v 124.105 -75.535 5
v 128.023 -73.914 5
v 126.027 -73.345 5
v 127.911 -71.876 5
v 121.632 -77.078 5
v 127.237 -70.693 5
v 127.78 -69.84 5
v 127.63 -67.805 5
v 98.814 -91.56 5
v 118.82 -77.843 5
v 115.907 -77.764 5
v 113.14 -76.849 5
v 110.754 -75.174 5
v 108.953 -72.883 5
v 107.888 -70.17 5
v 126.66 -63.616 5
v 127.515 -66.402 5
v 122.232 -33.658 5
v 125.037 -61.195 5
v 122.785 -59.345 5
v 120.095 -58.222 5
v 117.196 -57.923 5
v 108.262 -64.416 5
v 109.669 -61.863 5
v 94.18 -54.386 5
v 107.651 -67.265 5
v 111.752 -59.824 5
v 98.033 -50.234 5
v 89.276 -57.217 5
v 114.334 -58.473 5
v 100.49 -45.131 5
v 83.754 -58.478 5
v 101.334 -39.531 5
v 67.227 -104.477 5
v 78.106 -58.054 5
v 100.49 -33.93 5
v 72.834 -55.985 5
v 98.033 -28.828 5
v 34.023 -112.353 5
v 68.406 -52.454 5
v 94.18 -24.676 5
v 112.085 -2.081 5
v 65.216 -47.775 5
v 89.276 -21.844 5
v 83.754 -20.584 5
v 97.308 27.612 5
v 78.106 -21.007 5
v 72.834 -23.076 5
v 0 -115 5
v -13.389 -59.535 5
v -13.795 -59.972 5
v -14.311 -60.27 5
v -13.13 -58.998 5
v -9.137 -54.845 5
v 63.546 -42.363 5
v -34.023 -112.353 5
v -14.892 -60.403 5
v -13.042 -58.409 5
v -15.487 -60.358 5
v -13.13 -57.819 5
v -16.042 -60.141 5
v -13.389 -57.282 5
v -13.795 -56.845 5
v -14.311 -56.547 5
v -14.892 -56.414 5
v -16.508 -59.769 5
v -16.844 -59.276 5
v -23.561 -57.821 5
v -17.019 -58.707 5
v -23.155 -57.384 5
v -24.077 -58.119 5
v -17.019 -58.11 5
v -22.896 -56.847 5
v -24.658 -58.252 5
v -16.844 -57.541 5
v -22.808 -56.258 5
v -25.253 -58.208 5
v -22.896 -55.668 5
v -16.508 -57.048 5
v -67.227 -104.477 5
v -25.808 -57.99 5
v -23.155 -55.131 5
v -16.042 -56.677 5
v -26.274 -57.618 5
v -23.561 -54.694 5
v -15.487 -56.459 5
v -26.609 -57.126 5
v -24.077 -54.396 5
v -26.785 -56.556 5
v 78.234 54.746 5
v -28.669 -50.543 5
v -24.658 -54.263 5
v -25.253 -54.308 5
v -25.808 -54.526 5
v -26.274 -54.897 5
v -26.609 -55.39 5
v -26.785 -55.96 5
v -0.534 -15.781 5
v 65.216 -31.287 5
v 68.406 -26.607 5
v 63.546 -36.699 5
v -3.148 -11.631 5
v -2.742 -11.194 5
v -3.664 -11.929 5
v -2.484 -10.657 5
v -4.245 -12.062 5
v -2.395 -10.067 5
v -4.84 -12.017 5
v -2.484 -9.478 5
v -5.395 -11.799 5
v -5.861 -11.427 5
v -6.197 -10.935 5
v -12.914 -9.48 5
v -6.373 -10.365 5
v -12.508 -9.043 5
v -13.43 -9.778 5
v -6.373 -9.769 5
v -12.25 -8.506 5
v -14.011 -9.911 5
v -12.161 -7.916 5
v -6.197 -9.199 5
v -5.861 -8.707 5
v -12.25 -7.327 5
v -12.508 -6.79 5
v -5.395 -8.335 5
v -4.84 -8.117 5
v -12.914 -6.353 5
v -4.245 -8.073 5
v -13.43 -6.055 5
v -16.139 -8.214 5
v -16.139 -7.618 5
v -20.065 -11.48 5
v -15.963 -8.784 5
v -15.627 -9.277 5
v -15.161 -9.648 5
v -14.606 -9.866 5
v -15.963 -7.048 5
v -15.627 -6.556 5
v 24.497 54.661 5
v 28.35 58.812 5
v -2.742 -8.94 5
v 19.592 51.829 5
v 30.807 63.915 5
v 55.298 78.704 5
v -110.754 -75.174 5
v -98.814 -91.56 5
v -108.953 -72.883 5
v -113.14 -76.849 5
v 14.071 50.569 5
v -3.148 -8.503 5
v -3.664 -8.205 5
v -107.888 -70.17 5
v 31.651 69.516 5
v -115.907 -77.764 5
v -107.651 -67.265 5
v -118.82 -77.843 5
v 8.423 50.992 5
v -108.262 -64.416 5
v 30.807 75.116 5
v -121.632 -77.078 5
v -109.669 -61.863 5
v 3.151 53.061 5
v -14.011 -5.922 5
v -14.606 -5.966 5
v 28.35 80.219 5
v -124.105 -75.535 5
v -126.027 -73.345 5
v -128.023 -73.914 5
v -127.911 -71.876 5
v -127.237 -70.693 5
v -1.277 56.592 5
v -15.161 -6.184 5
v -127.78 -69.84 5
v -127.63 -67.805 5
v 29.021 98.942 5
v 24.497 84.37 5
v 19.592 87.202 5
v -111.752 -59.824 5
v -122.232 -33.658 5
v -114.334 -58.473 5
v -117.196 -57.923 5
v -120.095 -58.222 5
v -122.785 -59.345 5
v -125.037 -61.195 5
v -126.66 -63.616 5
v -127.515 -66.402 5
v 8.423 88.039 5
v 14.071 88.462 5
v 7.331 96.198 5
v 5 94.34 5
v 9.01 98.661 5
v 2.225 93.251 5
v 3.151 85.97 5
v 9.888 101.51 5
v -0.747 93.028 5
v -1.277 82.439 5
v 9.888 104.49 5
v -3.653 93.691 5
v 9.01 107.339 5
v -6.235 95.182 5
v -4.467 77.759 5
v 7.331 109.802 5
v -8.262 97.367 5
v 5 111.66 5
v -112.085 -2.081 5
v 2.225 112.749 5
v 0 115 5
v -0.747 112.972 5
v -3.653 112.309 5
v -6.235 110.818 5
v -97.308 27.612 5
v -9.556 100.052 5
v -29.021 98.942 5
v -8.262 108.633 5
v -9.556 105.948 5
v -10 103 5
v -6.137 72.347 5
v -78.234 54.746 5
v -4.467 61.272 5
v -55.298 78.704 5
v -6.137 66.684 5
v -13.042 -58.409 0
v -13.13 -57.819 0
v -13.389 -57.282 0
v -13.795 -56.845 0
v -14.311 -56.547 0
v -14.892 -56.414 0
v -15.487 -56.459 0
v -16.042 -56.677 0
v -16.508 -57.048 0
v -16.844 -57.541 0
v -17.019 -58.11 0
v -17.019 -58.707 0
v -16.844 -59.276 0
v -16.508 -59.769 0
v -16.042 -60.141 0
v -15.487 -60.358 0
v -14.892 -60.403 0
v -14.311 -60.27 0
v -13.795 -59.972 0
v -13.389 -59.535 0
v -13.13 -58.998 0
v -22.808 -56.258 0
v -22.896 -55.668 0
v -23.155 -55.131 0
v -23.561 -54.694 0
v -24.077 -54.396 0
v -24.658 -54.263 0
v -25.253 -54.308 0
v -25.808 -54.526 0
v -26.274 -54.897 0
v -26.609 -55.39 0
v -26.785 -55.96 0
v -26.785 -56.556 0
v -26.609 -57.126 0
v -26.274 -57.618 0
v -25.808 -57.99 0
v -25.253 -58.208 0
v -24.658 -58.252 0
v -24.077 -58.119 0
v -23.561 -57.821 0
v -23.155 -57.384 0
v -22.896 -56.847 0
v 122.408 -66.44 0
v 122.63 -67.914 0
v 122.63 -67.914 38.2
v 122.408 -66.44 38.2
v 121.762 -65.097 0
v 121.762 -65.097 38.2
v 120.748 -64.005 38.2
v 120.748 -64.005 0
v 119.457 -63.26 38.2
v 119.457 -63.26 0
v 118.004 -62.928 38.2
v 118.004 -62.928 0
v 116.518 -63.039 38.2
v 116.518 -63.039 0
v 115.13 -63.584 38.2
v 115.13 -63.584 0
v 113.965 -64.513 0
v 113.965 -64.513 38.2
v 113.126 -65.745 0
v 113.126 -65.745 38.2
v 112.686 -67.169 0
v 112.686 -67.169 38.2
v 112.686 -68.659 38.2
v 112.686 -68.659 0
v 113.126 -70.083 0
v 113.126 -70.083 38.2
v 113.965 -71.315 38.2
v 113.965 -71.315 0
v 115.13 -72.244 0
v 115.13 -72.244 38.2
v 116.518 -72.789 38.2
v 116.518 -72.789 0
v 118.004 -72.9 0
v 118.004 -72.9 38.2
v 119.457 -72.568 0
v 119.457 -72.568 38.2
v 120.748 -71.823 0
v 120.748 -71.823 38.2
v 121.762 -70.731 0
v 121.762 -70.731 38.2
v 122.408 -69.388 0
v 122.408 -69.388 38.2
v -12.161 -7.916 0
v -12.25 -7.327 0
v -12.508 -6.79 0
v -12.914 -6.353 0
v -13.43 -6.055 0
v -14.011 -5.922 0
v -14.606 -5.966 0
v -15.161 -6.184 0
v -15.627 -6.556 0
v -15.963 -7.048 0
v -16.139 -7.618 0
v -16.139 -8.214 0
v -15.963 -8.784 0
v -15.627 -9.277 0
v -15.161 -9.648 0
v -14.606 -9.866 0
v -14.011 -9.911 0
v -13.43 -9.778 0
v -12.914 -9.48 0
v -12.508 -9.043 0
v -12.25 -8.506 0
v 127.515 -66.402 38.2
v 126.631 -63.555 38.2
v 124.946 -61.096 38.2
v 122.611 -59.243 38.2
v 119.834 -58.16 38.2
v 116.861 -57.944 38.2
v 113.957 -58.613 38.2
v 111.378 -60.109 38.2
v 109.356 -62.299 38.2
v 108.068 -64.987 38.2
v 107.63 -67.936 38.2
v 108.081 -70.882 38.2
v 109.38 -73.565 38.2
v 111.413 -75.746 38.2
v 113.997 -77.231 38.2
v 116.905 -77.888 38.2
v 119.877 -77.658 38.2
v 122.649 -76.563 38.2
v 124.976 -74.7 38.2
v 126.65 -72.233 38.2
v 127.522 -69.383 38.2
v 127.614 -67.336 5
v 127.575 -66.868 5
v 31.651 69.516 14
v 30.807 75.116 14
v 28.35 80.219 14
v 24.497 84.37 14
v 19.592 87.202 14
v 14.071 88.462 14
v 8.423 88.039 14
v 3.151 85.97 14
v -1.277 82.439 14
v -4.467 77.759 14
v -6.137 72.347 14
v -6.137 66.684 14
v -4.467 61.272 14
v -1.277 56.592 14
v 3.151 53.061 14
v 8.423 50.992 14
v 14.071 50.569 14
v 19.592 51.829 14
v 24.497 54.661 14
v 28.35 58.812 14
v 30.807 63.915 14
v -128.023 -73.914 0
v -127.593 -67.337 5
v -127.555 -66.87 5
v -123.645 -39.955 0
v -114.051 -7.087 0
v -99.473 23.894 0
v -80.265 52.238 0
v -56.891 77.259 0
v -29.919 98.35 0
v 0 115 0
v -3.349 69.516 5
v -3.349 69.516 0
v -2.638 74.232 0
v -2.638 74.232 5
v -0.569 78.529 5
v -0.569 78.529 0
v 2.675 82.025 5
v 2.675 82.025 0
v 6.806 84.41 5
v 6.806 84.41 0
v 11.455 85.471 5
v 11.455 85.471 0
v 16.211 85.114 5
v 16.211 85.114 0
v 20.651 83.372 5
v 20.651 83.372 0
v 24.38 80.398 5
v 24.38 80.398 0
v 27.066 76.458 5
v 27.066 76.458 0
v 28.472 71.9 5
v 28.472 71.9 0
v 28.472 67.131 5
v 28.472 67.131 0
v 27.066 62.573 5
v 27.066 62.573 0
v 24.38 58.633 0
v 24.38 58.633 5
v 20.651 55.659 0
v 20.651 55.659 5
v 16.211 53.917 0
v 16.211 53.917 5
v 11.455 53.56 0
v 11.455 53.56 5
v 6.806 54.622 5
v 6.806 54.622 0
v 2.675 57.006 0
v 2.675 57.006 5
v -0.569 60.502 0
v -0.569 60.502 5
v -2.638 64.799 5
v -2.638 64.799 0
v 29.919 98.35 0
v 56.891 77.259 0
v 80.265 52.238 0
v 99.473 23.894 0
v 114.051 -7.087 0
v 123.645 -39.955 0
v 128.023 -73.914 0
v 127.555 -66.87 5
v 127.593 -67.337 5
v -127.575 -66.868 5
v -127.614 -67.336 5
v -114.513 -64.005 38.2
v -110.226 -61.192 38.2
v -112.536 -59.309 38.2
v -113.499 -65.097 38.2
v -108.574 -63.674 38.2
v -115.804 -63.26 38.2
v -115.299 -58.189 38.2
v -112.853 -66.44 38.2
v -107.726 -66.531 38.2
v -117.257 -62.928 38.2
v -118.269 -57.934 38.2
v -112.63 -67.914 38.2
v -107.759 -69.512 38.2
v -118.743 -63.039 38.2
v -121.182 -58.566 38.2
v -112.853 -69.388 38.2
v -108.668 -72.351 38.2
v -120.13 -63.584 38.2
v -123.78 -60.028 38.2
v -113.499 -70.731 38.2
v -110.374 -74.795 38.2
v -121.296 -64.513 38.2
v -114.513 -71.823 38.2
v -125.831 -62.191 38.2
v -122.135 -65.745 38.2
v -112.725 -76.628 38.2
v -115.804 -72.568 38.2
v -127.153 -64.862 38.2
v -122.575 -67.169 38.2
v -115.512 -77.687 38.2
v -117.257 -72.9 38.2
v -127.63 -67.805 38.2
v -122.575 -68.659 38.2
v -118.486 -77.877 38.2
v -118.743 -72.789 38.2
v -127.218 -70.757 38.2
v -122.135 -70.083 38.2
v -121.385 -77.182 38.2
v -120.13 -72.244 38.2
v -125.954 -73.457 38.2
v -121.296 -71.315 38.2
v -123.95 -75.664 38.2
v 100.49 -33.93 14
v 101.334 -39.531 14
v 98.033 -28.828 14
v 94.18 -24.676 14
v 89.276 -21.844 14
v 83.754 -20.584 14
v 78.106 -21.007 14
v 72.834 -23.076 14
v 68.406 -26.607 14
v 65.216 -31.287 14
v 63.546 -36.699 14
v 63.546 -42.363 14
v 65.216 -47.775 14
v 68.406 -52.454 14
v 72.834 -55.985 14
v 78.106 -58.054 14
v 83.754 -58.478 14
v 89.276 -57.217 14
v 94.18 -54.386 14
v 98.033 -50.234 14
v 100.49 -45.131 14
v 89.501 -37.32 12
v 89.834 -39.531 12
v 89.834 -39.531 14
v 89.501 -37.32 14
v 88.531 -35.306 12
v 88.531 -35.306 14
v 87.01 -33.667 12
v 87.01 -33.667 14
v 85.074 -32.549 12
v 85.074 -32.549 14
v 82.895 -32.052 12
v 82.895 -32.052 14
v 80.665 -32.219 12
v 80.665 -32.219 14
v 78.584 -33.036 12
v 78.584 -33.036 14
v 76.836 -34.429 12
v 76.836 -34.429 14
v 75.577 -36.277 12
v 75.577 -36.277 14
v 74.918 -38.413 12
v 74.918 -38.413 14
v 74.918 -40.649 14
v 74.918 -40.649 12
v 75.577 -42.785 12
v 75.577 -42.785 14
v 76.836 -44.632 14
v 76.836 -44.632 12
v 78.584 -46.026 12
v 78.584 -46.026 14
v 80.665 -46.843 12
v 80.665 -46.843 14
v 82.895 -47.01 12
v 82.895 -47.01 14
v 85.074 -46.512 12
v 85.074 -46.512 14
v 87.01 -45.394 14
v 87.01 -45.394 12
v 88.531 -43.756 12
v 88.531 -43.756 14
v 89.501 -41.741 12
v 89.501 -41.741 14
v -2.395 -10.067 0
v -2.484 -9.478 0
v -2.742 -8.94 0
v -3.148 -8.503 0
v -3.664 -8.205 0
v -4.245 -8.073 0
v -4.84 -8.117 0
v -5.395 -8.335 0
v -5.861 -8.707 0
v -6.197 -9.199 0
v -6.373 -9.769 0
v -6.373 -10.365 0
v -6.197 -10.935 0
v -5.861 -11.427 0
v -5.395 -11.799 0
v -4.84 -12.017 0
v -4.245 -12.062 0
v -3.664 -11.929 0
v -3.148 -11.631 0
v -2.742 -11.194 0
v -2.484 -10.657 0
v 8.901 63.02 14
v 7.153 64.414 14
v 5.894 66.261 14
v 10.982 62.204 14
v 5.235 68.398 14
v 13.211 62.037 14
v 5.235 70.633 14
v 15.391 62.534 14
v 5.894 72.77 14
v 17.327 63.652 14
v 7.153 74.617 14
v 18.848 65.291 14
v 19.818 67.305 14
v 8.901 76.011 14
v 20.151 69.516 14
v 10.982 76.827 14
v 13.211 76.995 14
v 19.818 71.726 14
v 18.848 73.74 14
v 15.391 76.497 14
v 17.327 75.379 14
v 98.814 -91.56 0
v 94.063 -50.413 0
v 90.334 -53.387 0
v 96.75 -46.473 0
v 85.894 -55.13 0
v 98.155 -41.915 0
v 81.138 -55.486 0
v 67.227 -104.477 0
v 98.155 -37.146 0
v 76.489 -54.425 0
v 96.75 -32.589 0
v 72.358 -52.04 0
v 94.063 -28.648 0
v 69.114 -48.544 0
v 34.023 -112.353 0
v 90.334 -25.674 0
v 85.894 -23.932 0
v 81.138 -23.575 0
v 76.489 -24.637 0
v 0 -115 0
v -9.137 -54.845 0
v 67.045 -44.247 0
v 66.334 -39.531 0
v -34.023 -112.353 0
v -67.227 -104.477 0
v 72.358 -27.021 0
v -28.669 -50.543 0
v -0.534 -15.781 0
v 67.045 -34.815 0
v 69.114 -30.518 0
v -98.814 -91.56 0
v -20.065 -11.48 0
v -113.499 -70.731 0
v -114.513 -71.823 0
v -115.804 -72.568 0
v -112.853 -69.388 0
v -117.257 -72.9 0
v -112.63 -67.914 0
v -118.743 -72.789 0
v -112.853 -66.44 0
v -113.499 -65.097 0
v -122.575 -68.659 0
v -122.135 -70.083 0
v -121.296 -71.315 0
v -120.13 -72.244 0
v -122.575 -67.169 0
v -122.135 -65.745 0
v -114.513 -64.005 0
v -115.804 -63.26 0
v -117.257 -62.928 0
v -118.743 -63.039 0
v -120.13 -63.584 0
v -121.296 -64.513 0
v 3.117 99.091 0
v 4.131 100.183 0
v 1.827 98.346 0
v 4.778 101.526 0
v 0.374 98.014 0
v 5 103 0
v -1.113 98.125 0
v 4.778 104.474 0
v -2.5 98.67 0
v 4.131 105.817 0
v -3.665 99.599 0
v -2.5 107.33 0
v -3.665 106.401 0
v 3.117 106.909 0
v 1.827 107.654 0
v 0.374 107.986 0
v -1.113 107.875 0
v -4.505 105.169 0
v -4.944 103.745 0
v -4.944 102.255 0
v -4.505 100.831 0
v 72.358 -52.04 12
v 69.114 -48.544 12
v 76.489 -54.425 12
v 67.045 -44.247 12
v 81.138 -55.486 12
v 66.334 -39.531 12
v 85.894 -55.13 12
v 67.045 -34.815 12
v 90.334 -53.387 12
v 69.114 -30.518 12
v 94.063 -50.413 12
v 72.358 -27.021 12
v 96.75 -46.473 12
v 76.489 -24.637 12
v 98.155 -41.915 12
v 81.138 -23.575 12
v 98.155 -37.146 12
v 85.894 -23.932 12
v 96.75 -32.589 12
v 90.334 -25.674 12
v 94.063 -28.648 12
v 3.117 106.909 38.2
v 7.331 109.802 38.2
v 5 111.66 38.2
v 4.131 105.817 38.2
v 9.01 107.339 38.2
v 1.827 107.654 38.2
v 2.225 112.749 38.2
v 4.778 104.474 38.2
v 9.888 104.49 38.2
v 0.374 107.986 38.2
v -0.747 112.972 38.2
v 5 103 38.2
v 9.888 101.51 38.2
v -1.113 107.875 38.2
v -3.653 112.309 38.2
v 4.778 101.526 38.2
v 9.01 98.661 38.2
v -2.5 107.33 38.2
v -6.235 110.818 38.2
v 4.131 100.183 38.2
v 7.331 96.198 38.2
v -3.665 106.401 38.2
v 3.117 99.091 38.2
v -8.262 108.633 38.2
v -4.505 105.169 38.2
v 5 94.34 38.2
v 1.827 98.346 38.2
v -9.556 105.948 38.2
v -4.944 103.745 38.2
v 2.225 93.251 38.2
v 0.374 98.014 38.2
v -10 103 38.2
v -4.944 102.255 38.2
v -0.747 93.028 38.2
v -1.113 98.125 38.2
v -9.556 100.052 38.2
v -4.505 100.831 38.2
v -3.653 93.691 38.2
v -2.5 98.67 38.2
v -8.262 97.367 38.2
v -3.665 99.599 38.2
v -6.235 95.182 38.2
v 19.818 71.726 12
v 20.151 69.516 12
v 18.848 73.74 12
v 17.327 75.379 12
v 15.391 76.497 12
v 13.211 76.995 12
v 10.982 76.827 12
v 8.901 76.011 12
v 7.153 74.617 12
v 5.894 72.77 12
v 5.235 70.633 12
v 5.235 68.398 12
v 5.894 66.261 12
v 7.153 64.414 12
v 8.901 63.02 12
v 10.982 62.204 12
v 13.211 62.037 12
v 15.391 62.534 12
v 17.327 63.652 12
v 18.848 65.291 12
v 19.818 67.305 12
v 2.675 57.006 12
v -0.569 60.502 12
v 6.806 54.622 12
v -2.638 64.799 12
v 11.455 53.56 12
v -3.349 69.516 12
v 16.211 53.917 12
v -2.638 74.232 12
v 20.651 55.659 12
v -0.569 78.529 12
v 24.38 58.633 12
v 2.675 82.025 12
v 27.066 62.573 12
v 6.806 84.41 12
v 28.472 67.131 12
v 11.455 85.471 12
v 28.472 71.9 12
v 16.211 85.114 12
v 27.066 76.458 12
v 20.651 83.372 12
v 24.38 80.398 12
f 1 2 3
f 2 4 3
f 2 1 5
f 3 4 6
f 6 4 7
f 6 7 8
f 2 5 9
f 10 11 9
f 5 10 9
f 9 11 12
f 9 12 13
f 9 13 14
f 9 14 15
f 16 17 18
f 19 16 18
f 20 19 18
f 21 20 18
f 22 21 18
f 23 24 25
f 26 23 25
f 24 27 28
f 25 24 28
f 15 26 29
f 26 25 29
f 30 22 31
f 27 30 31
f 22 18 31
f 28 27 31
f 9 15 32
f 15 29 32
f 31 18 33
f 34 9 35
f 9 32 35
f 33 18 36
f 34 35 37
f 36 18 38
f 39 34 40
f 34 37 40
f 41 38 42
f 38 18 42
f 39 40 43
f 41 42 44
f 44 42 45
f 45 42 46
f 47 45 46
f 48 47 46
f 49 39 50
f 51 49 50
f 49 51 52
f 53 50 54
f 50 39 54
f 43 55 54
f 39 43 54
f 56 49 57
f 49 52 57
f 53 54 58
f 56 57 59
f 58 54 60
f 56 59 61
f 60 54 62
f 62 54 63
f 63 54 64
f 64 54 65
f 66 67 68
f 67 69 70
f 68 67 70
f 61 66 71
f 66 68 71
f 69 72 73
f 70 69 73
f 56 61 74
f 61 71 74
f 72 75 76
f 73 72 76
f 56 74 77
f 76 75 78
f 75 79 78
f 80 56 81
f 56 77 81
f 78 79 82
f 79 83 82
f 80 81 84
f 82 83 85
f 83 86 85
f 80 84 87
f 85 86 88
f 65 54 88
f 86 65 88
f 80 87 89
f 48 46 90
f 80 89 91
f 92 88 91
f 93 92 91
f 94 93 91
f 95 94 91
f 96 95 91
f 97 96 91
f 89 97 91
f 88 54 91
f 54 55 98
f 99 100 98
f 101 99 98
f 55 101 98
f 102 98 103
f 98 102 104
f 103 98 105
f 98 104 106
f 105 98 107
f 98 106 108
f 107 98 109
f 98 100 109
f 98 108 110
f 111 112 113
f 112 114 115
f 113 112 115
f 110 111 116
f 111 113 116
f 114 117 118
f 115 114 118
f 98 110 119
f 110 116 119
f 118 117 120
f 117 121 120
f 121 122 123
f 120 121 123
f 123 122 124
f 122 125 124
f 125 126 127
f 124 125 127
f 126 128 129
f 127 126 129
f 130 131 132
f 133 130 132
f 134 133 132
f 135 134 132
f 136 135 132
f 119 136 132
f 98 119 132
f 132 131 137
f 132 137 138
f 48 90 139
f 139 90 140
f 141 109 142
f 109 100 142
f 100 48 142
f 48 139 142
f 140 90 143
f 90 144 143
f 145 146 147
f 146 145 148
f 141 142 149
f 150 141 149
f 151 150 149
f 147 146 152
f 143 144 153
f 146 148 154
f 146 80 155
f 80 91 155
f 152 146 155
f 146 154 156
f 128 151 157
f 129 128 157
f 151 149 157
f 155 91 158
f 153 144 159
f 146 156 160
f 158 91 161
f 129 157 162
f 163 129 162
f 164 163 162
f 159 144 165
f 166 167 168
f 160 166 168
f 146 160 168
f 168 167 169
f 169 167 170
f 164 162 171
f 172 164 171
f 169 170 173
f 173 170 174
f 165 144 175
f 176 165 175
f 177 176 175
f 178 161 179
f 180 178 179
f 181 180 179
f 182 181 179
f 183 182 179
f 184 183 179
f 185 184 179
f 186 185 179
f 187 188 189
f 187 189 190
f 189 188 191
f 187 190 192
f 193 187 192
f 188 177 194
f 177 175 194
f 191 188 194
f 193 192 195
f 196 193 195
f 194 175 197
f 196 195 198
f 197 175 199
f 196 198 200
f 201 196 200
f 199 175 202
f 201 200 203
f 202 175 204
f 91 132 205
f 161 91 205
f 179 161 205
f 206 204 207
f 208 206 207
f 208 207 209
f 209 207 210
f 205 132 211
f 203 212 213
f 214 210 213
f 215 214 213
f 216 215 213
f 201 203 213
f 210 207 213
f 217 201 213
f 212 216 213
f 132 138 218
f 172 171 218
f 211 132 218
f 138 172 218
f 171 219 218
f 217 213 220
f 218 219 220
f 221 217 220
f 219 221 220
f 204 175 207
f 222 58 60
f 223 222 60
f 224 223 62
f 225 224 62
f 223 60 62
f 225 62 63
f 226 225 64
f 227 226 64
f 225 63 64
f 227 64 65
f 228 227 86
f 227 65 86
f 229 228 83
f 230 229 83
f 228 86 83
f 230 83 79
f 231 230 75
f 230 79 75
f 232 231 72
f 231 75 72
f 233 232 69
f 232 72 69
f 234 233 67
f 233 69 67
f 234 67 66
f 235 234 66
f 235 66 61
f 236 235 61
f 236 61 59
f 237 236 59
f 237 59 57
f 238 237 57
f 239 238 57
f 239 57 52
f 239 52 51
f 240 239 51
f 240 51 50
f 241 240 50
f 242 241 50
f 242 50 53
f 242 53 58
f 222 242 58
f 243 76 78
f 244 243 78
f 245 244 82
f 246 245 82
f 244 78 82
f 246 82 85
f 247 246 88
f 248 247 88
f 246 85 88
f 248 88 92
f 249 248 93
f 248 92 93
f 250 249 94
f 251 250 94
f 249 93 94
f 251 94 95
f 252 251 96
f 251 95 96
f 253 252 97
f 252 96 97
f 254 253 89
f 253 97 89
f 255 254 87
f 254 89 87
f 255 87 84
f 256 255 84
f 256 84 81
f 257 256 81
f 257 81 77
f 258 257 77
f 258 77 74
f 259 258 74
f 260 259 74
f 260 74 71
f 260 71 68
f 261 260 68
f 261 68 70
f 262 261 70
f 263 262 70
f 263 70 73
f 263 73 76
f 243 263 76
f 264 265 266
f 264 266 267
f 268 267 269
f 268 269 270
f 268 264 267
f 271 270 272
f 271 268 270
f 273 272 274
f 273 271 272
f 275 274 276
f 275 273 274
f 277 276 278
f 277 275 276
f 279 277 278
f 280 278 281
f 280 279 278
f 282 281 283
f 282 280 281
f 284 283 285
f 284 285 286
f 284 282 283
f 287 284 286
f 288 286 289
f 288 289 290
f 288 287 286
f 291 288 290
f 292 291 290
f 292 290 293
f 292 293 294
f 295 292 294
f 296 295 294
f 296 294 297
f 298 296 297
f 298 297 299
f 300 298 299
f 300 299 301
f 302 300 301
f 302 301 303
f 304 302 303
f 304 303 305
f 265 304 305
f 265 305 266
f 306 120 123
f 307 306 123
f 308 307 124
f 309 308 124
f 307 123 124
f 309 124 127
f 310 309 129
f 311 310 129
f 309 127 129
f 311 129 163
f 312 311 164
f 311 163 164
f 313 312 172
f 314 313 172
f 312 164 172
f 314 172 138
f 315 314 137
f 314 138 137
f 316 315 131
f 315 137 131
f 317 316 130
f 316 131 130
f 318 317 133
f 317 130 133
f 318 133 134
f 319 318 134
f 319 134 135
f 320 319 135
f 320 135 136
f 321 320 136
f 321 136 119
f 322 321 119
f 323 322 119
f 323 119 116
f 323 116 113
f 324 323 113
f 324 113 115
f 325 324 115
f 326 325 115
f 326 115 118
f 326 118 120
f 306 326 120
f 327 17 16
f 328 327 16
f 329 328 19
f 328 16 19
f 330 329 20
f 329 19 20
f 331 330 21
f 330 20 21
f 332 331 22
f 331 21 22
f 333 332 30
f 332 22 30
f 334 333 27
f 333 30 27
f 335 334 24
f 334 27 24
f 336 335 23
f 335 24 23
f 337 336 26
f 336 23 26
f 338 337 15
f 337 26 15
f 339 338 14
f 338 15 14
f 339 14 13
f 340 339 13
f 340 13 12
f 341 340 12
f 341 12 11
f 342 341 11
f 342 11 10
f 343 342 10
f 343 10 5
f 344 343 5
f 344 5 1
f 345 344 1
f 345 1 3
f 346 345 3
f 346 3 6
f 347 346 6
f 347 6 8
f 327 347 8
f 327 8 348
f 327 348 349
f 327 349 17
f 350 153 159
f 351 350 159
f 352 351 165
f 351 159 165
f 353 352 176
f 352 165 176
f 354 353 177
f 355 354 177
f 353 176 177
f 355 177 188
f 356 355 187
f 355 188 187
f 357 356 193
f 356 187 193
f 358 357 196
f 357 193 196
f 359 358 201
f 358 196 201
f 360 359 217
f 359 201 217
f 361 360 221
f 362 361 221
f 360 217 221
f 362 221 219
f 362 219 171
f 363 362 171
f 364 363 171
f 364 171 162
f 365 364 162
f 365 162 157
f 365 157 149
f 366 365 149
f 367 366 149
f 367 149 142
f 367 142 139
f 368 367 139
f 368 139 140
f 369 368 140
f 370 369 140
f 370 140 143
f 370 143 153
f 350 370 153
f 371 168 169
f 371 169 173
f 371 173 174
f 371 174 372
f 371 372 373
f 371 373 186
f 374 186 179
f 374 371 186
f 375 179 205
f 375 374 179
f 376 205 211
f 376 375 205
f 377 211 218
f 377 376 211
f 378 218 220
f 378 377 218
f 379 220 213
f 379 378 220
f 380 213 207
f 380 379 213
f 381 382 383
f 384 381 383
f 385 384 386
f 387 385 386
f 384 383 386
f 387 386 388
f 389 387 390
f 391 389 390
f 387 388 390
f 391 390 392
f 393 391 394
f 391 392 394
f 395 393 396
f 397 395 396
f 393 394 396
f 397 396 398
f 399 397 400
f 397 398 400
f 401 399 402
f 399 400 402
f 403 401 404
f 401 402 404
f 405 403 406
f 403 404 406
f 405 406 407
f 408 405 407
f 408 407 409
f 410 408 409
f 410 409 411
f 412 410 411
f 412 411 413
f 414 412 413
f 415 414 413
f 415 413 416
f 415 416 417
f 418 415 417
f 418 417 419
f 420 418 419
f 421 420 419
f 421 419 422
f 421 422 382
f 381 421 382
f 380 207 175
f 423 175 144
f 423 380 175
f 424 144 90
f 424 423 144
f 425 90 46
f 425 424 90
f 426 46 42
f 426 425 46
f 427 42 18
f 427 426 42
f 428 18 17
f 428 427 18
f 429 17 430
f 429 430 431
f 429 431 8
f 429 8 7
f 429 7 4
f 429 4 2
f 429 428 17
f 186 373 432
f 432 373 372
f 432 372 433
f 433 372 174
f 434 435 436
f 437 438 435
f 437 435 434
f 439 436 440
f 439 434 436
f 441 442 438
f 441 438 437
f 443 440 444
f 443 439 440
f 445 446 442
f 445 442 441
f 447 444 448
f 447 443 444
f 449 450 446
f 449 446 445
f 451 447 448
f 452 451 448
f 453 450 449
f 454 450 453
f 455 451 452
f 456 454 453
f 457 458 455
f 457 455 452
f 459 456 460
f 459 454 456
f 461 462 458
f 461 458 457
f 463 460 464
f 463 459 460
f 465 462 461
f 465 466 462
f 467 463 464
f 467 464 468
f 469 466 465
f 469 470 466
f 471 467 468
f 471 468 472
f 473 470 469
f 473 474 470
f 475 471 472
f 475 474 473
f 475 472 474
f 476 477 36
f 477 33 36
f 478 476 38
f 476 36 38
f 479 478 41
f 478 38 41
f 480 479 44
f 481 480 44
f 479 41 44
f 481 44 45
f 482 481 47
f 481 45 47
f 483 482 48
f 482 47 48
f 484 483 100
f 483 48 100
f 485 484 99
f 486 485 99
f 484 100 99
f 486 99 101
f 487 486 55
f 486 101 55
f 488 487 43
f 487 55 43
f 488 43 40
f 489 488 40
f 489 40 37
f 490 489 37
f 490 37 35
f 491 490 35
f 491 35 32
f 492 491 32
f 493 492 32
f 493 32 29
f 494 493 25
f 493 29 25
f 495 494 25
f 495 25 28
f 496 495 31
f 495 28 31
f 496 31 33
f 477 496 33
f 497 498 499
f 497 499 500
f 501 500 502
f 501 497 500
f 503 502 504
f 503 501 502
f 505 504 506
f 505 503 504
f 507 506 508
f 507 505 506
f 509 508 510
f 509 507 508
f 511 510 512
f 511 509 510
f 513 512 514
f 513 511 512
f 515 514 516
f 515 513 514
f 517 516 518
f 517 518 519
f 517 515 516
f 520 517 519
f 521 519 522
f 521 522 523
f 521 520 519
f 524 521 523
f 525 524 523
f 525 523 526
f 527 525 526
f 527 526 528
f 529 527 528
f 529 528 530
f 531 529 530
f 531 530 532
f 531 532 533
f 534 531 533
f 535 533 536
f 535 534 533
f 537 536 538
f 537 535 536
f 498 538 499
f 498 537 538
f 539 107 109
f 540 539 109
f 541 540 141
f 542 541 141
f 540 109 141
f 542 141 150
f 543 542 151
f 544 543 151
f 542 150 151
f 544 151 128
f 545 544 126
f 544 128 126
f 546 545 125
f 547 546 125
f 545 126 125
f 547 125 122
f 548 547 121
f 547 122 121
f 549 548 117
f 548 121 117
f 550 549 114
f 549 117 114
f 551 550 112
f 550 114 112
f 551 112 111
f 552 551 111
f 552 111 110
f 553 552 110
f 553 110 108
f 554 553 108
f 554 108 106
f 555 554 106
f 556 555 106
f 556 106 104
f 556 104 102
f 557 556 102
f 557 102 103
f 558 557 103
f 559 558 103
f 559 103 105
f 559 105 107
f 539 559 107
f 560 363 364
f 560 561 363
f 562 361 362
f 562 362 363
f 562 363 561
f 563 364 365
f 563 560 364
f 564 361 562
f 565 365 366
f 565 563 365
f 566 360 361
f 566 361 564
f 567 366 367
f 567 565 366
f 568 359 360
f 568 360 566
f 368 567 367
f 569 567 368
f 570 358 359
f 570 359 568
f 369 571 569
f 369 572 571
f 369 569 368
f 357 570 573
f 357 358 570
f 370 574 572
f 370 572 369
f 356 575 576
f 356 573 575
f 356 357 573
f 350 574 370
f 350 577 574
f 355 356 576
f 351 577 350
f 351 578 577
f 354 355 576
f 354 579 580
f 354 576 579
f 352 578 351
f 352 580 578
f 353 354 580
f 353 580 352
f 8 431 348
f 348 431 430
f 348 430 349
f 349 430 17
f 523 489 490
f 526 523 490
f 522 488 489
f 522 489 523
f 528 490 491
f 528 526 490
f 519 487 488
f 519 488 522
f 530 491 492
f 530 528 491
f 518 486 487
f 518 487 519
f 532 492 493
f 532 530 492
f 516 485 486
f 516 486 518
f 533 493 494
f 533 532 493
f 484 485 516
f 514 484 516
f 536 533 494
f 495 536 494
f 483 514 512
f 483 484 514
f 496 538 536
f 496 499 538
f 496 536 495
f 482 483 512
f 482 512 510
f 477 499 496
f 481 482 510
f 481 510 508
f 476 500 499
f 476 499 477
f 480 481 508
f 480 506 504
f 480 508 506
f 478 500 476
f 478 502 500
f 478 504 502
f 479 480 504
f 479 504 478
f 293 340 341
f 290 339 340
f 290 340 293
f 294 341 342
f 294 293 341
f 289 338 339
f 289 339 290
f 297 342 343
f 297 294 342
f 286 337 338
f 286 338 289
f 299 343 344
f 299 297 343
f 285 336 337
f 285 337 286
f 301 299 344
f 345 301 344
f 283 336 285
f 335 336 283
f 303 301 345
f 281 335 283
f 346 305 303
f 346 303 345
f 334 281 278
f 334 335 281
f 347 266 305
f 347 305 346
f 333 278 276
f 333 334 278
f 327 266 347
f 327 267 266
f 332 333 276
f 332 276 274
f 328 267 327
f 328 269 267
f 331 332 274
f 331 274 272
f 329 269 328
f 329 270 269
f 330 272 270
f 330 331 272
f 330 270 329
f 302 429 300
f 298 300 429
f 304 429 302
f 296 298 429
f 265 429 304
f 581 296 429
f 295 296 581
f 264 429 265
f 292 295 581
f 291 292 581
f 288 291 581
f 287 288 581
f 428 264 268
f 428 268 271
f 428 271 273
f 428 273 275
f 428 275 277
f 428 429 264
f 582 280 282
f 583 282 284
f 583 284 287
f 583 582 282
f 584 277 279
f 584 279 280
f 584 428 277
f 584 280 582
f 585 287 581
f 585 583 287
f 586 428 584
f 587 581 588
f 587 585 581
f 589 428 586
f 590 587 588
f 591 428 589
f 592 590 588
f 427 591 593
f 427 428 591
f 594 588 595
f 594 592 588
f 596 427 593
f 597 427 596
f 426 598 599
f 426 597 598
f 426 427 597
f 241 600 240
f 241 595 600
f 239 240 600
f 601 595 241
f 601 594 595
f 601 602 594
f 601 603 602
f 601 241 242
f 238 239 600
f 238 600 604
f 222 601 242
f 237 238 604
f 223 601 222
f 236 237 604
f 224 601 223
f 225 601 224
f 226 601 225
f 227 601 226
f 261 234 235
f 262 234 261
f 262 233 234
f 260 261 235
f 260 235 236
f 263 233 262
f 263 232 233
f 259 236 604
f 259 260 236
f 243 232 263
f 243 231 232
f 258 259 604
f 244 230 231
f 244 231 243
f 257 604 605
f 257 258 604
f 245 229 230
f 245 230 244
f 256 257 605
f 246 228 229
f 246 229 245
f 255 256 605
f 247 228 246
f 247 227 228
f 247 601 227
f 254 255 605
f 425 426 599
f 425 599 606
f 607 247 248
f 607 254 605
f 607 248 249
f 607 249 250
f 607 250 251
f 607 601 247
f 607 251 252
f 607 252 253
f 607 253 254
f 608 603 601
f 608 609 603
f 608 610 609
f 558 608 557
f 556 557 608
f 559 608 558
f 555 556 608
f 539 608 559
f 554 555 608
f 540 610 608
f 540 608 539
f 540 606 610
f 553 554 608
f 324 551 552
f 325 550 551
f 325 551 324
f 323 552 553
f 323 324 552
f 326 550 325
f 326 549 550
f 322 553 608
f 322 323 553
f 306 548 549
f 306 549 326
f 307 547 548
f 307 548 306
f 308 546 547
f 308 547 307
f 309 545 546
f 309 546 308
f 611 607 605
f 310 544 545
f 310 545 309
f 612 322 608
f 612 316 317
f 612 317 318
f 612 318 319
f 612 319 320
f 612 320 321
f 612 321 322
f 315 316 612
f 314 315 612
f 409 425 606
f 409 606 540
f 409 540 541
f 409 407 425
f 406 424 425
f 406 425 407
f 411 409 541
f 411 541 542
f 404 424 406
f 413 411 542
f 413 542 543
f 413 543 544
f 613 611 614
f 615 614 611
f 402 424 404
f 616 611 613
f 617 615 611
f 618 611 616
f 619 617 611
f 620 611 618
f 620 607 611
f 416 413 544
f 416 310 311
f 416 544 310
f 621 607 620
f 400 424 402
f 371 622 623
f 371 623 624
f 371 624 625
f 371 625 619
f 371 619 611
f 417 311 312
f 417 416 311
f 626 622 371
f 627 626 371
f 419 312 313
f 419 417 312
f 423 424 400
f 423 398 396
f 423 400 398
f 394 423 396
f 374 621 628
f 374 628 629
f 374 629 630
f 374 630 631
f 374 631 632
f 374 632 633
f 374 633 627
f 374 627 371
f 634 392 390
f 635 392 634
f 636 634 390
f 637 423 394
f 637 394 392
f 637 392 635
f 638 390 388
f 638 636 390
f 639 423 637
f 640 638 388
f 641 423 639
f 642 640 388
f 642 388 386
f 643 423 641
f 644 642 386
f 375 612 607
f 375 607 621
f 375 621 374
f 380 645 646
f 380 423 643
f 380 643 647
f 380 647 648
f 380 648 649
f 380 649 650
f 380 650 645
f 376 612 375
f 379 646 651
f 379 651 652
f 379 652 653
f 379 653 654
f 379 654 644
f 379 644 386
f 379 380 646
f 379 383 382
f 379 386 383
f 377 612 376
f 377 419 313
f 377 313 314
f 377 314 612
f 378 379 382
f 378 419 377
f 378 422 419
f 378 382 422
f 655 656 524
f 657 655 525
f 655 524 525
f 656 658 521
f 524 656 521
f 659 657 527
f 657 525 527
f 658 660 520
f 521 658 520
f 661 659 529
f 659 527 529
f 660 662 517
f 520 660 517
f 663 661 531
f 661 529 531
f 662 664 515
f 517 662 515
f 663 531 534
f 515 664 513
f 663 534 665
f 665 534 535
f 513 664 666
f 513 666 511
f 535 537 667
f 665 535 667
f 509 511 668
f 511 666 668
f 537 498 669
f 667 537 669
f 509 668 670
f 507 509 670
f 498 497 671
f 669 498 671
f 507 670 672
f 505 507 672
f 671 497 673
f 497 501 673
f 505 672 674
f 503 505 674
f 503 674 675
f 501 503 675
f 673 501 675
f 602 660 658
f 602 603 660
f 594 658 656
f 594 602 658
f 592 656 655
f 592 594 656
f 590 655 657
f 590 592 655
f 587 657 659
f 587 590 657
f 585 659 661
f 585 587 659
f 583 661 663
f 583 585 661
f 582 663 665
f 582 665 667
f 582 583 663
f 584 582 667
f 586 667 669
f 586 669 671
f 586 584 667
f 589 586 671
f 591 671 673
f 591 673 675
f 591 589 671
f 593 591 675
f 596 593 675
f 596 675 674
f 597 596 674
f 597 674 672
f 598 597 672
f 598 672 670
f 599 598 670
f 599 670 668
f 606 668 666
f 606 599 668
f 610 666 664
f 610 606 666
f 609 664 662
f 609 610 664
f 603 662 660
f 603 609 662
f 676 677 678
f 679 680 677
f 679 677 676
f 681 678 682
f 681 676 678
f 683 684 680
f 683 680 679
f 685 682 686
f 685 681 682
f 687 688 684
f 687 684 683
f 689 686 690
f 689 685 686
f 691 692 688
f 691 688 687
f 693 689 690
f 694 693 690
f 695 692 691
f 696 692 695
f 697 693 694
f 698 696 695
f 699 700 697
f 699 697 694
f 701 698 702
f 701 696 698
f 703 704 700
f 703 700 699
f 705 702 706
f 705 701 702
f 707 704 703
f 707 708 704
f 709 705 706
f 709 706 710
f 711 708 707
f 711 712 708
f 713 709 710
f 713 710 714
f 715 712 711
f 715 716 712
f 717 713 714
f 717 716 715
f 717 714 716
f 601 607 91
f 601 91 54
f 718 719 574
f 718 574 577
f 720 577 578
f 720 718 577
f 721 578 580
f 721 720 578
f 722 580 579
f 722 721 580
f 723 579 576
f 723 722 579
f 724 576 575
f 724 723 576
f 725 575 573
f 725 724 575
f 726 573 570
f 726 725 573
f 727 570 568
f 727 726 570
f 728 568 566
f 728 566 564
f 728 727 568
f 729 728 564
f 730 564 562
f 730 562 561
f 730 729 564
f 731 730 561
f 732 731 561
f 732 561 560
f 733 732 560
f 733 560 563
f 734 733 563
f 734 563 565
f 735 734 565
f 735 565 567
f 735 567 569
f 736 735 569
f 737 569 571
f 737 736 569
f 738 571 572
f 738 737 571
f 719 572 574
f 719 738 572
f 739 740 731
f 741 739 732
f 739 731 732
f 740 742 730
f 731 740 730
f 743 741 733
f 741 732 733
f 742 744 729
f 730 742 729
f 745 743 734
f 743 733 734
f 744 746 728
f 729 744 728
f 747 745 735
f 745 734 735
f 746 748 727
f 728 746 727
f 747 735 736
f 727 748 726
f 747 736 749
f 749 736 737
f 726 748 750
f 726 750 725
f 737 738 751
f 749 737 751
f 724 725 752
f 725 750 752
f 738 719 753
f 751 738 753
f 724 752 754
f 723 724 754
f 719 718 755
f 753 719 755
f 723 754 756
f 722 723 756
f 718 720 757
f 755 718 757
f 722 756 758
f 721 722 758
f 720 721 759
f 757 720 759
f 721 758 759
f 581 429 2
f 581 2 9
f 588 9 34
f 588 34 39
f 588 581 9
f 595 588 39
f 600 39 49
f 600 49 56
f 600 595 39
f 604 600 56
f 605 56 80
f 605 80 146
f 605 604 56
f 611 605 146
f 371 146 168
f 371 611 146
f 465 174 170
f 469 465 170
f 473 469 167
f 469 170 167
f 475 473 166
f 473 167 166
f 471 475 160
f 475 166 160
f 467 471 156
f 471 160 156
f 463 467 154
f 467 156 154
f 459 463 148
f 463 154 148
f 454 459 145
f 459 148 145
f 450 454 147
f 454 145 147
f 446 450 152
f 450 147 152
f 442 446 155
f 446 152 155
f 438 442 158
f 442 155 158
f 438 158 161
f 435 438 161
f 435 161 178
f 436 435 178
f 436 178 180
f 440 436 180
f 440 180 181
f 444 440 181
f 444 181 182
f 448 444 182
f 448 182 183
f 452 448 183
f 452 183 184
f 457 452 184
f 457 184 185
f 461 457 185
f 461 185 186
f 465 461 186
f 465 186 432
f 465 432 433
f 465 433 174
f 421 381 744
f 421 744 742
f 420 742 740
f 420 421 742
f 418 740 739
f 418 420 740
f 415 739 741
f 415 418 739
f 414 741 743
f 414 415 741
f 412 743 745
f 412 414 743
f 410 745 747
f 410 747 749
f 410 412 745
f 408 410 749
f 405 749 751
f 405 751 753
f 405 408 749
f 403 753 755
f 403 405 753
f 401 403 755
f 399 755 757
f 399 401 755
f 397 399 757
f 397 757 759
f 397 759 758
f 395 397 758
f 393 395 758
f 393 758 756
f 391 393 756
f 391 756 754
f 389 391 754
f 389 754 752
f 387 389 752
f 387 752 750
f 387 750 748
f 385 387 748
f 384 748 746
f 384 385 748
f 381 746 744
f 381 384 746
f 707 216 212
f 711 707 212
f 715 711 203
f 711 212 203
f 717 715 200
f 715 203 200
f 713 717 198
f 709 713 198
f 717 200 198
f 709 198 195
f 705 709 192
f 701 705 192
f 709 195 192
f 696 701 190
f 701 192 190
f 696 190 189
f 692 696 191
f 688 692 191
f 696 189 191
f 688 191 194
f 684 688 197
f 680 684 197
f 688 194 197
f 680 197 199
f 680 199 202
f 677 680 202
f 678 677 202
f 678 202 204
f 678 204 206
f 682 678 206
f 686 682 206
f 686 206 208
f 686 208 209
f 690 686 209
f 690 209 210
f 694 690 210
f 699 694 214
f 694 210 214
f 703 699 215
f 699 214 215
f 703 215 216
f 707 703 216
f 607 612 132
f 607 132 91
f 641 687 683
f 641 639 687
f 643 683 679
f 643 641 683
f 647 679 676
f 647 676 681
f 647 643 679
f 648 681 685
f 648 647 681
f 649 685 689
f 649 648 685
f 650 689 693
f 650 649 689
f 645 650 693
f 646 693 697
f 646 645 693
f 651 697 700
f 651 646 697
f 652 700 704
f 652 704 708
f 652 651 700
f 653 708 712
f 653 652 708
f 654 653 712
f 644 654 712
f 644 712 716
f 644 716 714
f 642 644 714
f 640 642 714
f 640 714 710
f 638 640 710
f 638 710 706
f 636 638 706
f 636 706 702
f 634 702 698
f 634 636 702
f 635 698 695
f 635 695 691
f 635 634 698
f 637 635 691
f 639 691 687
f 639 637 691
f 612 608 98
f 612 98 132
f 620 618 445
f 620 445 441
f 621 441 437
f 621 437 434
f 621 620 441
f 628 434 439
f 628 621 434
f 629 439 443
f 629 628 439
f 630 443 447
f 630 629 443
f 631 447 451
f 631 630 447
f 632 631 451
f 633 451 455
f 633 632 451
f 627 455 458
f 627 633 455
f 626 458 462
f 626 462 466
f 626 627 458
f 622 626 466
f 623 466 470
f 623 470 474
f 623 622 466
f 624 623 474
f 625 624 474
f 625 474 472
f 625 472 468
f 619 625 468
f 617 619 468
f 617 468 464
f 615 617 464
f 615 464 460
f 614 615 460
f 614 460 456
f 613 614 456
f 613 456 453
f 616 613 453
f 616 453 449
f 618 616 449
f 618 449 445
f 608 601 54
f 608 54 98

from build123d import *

# Parameters (mm, degrees)
SKETCH_1_R          = 5
EXTRUDE_1_DEPTH     = 5
SKETCH_2_R          = 10
SKETCH_2_R_2        = 5
EXTRUDE_2_DEPTH     = 33.2
SKETCH_4_R          = 16
CUT_EXTRUDE_2_DEPTH = 15
SKETCH_7_R          = 19
SKETCH_7_R_2        = 16
EXTRUDE_3_DEPTH     = 7
SKETCH_8_R          = 19
SKETCH_8_R_2        = 7.5
EXTRUDE_4_DEPTH     = 2
CUT_EXTRUDE_3_DEPTH = 10
SKETCH_10_R         = 2
CUT_EXTRUDE_4_DEPTH = 10


with BuildPart() as part:
    # 草图1 → 凸台-拉伸1 (new body)
    with BuildSketch(Plane.XY):
        with BuildLine():
            ThreePointArc((-128.022678922, -73.913928138), (-90.421378279, 38.440519474), (0, 115))
            ThreePointArc((0, 115), (90.421378279, 38.440519474), (128.022678922, -73.913928138))
            ThreePointArc((128.022678922, -73.913928138), (0, -115), (-128.022678922, -73.913928138))
        make_face()
        with Locations((0, 103)):
            Circle(SKETCH_1_R, mode=Mode.SUBTRACT)
        with Locations((-117.630374076, -67.913928138)):
            Circle(SKETCH_1_R, mode=Mode.SUBTRACT)
        with Locations((117.630374076, -67.913928138)):
            Circle(SKETCH_1_R, mode=Mode.SUBTRACT)
    extrude(amount=EXTRUDE_1_DEPTH)

    # 草图2 → 凸台-拉伸2 (add)
    # profile 1 of 3: a face of its own
    with BuildSketch(Plane.XY.offset(5)):
        with Locations(Location((0, 103, 0), (0, 0, 180))):
            Circle(SKETCH_2_R)
        with Locations((0, 103)):
            Circle(SKETCH_2_R_2, mode=Mode.SUBTRACT)
    # profile 2 of 3: a face of its own
    with BuildSketch(Plane.XY.offset(5)):
        with Locations(Location((-117.630374076, -67.913928138, 0), (0, 0, 179.375778052))):
            Circle(SKETCH_2_R)
        with Locations((-117.630374076, -67.913928138)):
            Circle(SKETCH_2_R_2, mode=Mode.SUBTRACT)
    # profile 3 of 3: a face of its own
    with BuildSketch(Plane.XY.offset(5)):
        with Locations(Location((117.630374076, -67.913928138, 0), (0, 0, 8.696571879))):
            Circle(SKETCH_2_R)
        with Locations((117.630374076, -67.913928138)):
            Circle(SKETCH_2_R_2, mode=Mode.SUBTRACT)
    extrude(amount=EXTRUDE_2_DEPTH)

    # 草图4 → 切除-拉伸2 (cut)
    with BuildSketch(Plane(origin=(0, 0, 0), x_dir=(-1, 0, 0), z_dir=(0, 0, -1))):
        with Locations((-12.650995066, 69.515536741)):
            Circle(SKETCH_4_R)
        with Locations((-82.334125615, -39.530718783)):
            Circle(SKETCH_4_R)
    extrude(amount=-CUT_EXTRUDE_2_DEPTH, mode=Mode.SUBTRACT)

    # 草图7 → 凸台-拉伸3 (add)
    # profile 1 of 2: a face of its own
    with BuildSketch(Plane.XY.offset(5)):
        with Locations((82.334125615, -39.530718783)):
            Circle(SKETCH_7_R)
        with Locations(Location((82.334125615, -39.530718783, 0), (0, 0, 180))):
            Circle(SKETCH_7_R_2, mode=Mode.SUBTRACT)
    # profile 2 of 2: a face of its own
    with BuildSketch(Plane.XY.offset(5)):
        with Locations((12.650995066, 69.515536741)):
            Circle(SKETCH_7_R)
        with Locations(Location((12.650995066, 69.515536741, 0), (0, 0, 180))):
            Circle(SKETCH_7_R_2, mode=Mode.SUBTRACT)
    extrude(amount=EXTRUDE_3_DEPTH)

    # 草图8 → 凸台-拉伸4 (add)
    # profile 1 of 2: a face of its own
    with BuildSketch(Plane.XY.offset(12)):
        with Locations((82.334125615, -39.530718783)):
            Circle(SKETCH_8_R)
        with Locations((82.334125615, -39.530718783)):
            Circle(SKETCH_8_R_2, mode=Mode.SUBTRACT)
    # profile 2 of 2: a face of its own
    with BuildSketch(Plane.XY.offset(12)):
        with Locations((12.650995066, 69.515536741)):
            Circle(SKETCH_8_R)
        with Locations((12.650995066, 69.515536741)):
            Circle(SKETCH_8_R_2, mode=Mode.SUBTRACT)
    extrude(amount=EXTRUDE_4_DEPTH)

    # 草图9 → 切除-拉伸3 (cut)
    with BuildSketch(Plane(origin=(0, 0, 0), x_dir=(-1, 0, 0), z_dir=(0, 0, -1))):
        Polygon((20.065498734, -11.479666127), (28.668863324, -50.543487212), (9.136952782, -54.845169507), (0.533588192, -15.781348422), align=None)
    extrude(amount=-CUT_EXTRUDE_3_DEPTH, mode=Mode.SUBTRACT)

    # 草图10 → 切除-拉伸4 (cut)
    with BuildSketch(Plane.XY.offset(5)):
        with Locations((-24.807535234, -56.257736539)):
            Circle(SKETCH_10_R)
        with Locations((-15.041579962, -58.408577687)):
            Circle(SKETCH_10_R)
        with Locations((-14.160871553, -7.916257947)):
            Circle(SKETCH_10_R)
        with Locations((-4.394916282, -10.067099095)):
            Circle(SKETCH_10_R)
    extrude(amount=-CUT_EXTRUDE_4_DEPTH, mode=Mode.SUBTRACT)


solid = part.part
